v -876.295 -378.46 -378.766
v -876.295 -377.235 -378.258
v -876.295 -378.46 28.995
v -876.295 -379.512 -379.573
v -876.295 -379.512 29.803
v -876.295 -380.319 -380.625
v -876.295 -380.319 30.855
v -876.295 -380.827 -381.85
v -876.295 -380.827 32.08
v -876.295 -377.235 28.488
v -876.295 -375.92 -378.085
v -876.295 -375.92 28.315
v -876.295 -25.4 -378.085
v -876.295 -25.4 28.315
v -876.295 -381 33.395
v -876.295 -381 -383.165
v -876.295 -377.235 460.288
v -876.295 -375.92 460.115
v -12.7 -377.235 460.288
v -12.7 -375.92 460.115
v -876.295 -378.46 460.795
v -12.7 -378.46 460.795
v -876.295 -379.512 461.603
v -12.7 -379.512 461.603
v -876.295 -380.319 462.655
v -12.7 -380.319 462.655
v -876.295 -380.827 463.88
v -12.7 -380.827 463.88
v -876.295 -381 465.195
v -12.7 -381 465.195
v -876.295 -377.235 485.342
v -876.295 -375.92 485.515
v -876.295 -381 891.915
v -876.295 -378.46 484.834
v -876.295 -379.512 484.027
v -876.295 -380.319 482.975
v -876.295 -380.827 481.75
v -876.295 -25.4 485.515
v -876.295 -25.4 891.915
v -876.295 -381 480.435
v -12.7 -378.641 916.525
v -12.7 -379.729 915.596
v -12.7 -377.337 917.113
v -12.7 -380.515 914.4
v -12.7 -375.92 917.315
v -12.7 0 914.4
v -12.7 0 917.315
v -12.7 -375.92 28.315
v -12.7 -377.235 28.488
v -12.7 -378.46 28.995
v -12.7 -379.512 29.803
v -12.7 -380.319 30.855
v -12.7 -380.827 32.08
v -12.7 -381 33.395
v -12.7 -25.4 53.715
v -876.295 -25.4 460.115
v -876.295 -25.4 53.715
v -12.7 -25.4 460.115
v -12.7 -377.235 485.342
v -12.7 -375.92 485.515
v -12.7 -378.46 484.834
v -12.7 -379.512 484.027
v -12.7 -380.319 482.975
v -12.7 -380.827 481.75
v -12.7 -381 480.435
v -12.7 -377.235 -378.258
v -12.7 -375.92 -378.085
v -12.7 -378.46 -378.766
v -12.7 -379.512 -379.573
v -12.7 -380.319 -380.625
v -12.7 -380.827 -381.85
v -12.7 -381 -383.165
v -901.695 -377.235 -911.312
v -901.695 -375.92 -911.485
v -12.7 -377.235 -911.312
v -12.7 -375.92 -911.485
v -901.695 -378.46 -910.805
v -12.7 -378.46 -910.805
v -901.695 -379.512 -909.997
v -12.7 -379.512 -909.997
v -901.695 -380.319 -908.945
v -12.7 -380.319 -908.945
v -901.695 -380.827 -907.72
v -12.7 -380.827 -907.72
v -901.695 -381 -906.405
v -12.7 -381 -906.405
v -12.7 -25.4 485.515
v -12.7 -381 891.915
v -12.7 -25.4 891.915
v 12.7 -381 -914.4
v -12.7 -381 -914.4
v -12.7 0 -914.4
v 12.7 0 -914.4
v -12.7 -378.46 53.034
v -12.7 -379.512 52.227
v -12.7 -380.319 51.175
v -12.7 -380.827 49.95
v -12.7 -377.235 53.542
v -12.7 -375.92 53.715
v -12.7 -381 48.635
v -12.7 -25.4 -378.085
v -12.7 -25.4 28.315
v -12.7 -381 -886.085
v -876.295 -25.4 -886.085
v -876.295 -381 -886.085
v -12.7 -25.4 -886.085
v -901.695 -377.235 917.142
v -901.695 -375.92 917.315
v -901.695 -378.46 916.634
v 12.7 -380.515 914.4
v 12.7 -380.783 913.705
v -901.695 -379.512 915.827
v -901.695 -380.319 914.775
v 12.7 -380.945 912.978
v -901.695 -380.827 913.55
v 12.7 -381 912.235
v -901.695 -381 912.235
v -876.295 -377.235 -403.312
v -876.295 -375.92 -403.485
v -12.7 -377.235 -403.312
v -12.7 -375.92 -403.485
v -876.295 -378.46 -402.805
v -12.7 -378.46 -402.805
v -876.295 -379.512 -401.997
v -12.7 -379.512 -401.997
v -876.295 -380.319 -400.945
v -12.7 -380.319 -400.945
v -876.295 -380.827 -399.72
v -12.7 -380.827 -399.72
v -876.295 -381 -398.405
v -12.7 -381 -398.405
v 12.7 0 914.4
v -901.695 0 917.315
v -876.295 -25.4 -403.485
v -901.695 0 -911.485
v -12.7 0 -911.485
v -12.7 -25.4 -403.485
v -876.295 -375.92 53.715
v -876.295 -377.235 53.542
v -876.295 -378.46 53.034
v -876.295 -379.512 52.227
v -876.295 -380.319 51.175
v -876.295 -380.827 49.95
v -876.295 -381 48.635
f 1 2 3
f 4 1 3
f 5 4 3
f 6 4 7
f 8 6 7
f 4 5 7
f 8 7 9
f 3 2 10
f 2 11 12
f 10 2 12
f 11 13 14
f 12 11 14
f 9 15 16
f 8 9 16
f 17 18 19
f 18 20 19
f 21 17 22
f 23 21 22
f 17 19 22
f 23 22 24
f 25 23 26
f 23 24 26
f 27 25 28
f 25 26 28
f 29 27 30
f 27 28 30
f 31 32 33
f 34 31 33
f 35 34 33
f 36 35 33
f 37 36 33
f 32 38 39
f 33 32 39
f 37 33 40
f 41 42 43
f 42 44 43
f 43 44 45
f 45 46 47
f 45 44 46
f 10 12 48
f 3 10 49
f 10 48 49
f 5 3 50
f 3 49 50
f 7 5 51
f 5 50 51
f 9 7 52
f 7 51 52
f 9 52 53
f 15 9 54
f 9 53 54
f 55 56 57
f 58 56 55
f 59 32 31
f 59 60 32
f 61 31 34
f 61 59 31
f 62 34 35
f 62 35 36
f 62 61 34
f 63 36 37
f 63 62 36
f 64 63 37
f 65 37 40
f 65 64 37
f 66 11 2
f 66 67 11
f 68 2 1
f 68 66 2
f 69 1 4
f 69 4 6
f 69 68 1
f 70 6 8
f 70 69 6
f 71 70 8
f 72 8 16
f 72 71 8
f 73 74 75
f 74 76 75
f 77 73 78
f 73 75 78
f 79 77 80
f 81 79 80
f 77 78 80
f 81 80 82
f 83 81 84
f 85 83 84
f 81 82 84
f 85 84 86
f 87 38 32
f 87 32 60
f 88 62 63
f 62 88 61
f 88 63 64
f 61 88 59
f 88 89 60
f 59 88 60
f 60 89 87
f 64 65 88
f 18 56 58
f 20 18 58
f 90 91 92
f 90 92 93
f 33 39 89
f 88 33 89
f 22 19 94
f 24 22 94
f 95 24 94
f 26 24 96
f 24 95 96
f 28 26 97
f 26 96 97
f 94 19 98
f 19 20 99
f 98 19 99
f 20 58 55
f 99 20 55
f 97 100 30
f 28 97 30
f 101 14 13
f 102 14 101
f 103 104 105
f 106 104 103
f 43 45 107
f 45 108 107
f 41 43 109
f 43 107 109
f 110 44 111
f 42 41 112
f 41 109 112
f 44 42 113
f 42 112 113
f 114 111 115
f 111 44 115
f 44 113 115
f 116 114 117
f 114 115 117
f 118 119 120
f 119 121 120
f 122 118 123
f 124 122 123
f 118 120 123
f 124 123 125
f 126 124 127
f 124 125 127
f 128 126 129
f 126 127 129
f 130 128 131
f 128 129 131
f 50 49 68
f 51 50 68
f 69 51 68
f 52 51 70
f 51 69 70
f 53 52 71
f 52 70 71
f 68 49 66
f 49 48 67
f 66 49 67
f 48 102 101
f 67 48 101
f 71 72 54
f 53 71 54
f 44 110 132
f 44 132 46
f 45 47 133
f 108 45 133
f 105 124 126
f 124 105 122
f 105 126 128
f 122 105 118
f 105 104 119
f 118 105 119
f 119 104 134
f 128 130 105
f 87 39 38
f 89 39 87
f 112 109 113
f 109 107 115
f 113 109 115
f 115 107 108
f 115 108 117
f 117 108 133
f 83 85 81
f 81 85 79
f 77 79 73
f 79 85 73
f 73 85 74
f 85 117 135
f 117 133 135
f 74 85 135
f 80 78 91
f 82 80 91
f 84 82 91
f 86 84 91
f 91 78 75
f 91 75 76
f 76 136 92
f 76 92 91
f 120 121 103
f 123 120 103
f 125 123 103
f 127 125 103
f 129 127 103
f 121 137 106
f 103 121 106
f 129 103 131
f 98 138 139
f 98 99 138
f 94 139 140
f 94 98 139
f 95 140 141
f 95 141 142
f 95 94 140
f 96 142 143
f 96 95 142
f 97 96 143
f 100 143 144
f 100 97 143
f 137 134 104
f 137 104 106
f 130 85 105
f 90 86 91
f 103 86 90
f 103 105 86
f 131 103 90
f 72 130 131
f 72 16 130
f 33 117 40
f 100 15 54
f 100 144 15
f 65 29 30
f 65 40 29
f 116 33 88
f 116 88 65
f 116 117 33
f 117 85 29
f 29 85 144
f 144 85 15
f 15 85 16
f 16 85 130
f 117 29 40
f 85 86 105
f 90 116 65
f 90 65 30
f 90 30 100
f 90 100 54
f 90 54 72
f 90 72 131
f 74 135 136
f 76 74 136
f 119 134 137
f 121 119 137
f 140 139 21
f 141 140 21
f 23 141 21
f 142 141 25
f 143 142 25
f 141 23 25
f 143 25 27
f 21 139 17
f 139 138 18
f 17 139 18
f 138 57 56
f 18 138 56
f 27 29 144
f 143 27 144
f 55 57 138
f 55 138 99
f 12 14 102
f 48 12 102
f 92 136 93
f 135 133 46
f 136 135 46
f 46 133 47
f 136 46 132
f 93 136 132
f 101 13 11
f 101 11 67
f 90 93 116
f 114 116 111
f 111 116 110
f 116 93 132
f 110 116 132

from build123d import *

# Parameters (mm, degrees)
F0_W     = 863.595354099
F0_H     = 25.4
F1_DEPTH = 381
F2_R     = 5.08
F0_H_2   = 482.6
F0_H_3   = 406.4
F3_DEPTH = 25.4


with BuildPart() as f1:
    # F0 (on Front) → F1 (new body)
    with BuildSketch(Plane.XZ):
        Polygon((-12.7, 891.914858846), (-12.7, 914.4), (-12.7, 917.314858846), (-876.295354099, 917.314858846), (-876.295354099, 891.914858846), align=None)
        with Locations((-444.4976770495, -898.785141154)):
            Rectangle(F0_W, F0_H)
        Polygon((-901.695354099, -911.485141154), (-876.295354099, -911.485141154), (-876.295354099, -886.085141154), (-876.295354099, -403.485141154), (-876.295354099, -378.085141154), (-876.295354099, 28.314858846), (-876.295354099, 53.714858846), (-876.295354099, 460.114858846), (-876.295354099, 485.514858846), (-876.295354099, 891.914858846), (-876.295354099, 917.314858846), (-901.695354099, 917.314858846), align=None)
        Polygon((-12.7, -911.485141154), (-12.7, -914.4), (12.7, -914.4), (12.7, 914.4), (-12.7, 914.4), (-12.7, 891.914858846), (-12.7, 485.514858846), (-12.7, 460.114858846), (-12.7, 53.714858846), (-12.7, 28.314858846), (-12.7, -378.085141154), (-12.7, -403.485141154), (-12.7, -886.085141154), align=None)
        with Locations((-444.4976770495, 472.814858846)):
            Rectangle(F0_W, F0_H)
        with Locations((-444.4976770495, 41.014858846)):
            Rectangle(F0_W, F0_H)
        with Locations((-444.4976770495, -390.785141154)):
            Rectangle(F0_W, F0_H)
    extrude(amount=F1_DEPTH)

    # F2
    f2_edges = [f1.edges().sort_by_distance(p)[0] for p in [
        (-457.197677, -381, 917.314859),
        (-444.497677, -381, 485.514859),
        (-444.497677, -381, 460.114859),
        (-444.497677, -381, 53.714859),
        (-444.497677, -381, -378.085141),
        (-444.497677, -381, 28.314859),
        (-444.497677, -381, -403.485141),
        (-457.197677, -381, -911.485141),
    ]]
    fillet(f2_edges, radius=F2_R)

    # F0 (on Front) → F3 (join)
    with BuildSketch(Plane.XZ):
        with Locations((-444.4976770495, -644.785141154)):
            Rectangle(F0_W, F0_H_2)
        with Locations((-444.4976770495, -174.885141154)):
            Rectangle(F0_W, F0_H_3)
        with Locations((-444.4976770495, 256.914858846)):
            Rectangle(F0_W, F0_H_3)
        with Locations((-444.4976770495, 688.714858846)):
            Rectangle(F0_W, F0_H_3)
    extrude(amount=F3_DEPTH)


solid = f1.part
